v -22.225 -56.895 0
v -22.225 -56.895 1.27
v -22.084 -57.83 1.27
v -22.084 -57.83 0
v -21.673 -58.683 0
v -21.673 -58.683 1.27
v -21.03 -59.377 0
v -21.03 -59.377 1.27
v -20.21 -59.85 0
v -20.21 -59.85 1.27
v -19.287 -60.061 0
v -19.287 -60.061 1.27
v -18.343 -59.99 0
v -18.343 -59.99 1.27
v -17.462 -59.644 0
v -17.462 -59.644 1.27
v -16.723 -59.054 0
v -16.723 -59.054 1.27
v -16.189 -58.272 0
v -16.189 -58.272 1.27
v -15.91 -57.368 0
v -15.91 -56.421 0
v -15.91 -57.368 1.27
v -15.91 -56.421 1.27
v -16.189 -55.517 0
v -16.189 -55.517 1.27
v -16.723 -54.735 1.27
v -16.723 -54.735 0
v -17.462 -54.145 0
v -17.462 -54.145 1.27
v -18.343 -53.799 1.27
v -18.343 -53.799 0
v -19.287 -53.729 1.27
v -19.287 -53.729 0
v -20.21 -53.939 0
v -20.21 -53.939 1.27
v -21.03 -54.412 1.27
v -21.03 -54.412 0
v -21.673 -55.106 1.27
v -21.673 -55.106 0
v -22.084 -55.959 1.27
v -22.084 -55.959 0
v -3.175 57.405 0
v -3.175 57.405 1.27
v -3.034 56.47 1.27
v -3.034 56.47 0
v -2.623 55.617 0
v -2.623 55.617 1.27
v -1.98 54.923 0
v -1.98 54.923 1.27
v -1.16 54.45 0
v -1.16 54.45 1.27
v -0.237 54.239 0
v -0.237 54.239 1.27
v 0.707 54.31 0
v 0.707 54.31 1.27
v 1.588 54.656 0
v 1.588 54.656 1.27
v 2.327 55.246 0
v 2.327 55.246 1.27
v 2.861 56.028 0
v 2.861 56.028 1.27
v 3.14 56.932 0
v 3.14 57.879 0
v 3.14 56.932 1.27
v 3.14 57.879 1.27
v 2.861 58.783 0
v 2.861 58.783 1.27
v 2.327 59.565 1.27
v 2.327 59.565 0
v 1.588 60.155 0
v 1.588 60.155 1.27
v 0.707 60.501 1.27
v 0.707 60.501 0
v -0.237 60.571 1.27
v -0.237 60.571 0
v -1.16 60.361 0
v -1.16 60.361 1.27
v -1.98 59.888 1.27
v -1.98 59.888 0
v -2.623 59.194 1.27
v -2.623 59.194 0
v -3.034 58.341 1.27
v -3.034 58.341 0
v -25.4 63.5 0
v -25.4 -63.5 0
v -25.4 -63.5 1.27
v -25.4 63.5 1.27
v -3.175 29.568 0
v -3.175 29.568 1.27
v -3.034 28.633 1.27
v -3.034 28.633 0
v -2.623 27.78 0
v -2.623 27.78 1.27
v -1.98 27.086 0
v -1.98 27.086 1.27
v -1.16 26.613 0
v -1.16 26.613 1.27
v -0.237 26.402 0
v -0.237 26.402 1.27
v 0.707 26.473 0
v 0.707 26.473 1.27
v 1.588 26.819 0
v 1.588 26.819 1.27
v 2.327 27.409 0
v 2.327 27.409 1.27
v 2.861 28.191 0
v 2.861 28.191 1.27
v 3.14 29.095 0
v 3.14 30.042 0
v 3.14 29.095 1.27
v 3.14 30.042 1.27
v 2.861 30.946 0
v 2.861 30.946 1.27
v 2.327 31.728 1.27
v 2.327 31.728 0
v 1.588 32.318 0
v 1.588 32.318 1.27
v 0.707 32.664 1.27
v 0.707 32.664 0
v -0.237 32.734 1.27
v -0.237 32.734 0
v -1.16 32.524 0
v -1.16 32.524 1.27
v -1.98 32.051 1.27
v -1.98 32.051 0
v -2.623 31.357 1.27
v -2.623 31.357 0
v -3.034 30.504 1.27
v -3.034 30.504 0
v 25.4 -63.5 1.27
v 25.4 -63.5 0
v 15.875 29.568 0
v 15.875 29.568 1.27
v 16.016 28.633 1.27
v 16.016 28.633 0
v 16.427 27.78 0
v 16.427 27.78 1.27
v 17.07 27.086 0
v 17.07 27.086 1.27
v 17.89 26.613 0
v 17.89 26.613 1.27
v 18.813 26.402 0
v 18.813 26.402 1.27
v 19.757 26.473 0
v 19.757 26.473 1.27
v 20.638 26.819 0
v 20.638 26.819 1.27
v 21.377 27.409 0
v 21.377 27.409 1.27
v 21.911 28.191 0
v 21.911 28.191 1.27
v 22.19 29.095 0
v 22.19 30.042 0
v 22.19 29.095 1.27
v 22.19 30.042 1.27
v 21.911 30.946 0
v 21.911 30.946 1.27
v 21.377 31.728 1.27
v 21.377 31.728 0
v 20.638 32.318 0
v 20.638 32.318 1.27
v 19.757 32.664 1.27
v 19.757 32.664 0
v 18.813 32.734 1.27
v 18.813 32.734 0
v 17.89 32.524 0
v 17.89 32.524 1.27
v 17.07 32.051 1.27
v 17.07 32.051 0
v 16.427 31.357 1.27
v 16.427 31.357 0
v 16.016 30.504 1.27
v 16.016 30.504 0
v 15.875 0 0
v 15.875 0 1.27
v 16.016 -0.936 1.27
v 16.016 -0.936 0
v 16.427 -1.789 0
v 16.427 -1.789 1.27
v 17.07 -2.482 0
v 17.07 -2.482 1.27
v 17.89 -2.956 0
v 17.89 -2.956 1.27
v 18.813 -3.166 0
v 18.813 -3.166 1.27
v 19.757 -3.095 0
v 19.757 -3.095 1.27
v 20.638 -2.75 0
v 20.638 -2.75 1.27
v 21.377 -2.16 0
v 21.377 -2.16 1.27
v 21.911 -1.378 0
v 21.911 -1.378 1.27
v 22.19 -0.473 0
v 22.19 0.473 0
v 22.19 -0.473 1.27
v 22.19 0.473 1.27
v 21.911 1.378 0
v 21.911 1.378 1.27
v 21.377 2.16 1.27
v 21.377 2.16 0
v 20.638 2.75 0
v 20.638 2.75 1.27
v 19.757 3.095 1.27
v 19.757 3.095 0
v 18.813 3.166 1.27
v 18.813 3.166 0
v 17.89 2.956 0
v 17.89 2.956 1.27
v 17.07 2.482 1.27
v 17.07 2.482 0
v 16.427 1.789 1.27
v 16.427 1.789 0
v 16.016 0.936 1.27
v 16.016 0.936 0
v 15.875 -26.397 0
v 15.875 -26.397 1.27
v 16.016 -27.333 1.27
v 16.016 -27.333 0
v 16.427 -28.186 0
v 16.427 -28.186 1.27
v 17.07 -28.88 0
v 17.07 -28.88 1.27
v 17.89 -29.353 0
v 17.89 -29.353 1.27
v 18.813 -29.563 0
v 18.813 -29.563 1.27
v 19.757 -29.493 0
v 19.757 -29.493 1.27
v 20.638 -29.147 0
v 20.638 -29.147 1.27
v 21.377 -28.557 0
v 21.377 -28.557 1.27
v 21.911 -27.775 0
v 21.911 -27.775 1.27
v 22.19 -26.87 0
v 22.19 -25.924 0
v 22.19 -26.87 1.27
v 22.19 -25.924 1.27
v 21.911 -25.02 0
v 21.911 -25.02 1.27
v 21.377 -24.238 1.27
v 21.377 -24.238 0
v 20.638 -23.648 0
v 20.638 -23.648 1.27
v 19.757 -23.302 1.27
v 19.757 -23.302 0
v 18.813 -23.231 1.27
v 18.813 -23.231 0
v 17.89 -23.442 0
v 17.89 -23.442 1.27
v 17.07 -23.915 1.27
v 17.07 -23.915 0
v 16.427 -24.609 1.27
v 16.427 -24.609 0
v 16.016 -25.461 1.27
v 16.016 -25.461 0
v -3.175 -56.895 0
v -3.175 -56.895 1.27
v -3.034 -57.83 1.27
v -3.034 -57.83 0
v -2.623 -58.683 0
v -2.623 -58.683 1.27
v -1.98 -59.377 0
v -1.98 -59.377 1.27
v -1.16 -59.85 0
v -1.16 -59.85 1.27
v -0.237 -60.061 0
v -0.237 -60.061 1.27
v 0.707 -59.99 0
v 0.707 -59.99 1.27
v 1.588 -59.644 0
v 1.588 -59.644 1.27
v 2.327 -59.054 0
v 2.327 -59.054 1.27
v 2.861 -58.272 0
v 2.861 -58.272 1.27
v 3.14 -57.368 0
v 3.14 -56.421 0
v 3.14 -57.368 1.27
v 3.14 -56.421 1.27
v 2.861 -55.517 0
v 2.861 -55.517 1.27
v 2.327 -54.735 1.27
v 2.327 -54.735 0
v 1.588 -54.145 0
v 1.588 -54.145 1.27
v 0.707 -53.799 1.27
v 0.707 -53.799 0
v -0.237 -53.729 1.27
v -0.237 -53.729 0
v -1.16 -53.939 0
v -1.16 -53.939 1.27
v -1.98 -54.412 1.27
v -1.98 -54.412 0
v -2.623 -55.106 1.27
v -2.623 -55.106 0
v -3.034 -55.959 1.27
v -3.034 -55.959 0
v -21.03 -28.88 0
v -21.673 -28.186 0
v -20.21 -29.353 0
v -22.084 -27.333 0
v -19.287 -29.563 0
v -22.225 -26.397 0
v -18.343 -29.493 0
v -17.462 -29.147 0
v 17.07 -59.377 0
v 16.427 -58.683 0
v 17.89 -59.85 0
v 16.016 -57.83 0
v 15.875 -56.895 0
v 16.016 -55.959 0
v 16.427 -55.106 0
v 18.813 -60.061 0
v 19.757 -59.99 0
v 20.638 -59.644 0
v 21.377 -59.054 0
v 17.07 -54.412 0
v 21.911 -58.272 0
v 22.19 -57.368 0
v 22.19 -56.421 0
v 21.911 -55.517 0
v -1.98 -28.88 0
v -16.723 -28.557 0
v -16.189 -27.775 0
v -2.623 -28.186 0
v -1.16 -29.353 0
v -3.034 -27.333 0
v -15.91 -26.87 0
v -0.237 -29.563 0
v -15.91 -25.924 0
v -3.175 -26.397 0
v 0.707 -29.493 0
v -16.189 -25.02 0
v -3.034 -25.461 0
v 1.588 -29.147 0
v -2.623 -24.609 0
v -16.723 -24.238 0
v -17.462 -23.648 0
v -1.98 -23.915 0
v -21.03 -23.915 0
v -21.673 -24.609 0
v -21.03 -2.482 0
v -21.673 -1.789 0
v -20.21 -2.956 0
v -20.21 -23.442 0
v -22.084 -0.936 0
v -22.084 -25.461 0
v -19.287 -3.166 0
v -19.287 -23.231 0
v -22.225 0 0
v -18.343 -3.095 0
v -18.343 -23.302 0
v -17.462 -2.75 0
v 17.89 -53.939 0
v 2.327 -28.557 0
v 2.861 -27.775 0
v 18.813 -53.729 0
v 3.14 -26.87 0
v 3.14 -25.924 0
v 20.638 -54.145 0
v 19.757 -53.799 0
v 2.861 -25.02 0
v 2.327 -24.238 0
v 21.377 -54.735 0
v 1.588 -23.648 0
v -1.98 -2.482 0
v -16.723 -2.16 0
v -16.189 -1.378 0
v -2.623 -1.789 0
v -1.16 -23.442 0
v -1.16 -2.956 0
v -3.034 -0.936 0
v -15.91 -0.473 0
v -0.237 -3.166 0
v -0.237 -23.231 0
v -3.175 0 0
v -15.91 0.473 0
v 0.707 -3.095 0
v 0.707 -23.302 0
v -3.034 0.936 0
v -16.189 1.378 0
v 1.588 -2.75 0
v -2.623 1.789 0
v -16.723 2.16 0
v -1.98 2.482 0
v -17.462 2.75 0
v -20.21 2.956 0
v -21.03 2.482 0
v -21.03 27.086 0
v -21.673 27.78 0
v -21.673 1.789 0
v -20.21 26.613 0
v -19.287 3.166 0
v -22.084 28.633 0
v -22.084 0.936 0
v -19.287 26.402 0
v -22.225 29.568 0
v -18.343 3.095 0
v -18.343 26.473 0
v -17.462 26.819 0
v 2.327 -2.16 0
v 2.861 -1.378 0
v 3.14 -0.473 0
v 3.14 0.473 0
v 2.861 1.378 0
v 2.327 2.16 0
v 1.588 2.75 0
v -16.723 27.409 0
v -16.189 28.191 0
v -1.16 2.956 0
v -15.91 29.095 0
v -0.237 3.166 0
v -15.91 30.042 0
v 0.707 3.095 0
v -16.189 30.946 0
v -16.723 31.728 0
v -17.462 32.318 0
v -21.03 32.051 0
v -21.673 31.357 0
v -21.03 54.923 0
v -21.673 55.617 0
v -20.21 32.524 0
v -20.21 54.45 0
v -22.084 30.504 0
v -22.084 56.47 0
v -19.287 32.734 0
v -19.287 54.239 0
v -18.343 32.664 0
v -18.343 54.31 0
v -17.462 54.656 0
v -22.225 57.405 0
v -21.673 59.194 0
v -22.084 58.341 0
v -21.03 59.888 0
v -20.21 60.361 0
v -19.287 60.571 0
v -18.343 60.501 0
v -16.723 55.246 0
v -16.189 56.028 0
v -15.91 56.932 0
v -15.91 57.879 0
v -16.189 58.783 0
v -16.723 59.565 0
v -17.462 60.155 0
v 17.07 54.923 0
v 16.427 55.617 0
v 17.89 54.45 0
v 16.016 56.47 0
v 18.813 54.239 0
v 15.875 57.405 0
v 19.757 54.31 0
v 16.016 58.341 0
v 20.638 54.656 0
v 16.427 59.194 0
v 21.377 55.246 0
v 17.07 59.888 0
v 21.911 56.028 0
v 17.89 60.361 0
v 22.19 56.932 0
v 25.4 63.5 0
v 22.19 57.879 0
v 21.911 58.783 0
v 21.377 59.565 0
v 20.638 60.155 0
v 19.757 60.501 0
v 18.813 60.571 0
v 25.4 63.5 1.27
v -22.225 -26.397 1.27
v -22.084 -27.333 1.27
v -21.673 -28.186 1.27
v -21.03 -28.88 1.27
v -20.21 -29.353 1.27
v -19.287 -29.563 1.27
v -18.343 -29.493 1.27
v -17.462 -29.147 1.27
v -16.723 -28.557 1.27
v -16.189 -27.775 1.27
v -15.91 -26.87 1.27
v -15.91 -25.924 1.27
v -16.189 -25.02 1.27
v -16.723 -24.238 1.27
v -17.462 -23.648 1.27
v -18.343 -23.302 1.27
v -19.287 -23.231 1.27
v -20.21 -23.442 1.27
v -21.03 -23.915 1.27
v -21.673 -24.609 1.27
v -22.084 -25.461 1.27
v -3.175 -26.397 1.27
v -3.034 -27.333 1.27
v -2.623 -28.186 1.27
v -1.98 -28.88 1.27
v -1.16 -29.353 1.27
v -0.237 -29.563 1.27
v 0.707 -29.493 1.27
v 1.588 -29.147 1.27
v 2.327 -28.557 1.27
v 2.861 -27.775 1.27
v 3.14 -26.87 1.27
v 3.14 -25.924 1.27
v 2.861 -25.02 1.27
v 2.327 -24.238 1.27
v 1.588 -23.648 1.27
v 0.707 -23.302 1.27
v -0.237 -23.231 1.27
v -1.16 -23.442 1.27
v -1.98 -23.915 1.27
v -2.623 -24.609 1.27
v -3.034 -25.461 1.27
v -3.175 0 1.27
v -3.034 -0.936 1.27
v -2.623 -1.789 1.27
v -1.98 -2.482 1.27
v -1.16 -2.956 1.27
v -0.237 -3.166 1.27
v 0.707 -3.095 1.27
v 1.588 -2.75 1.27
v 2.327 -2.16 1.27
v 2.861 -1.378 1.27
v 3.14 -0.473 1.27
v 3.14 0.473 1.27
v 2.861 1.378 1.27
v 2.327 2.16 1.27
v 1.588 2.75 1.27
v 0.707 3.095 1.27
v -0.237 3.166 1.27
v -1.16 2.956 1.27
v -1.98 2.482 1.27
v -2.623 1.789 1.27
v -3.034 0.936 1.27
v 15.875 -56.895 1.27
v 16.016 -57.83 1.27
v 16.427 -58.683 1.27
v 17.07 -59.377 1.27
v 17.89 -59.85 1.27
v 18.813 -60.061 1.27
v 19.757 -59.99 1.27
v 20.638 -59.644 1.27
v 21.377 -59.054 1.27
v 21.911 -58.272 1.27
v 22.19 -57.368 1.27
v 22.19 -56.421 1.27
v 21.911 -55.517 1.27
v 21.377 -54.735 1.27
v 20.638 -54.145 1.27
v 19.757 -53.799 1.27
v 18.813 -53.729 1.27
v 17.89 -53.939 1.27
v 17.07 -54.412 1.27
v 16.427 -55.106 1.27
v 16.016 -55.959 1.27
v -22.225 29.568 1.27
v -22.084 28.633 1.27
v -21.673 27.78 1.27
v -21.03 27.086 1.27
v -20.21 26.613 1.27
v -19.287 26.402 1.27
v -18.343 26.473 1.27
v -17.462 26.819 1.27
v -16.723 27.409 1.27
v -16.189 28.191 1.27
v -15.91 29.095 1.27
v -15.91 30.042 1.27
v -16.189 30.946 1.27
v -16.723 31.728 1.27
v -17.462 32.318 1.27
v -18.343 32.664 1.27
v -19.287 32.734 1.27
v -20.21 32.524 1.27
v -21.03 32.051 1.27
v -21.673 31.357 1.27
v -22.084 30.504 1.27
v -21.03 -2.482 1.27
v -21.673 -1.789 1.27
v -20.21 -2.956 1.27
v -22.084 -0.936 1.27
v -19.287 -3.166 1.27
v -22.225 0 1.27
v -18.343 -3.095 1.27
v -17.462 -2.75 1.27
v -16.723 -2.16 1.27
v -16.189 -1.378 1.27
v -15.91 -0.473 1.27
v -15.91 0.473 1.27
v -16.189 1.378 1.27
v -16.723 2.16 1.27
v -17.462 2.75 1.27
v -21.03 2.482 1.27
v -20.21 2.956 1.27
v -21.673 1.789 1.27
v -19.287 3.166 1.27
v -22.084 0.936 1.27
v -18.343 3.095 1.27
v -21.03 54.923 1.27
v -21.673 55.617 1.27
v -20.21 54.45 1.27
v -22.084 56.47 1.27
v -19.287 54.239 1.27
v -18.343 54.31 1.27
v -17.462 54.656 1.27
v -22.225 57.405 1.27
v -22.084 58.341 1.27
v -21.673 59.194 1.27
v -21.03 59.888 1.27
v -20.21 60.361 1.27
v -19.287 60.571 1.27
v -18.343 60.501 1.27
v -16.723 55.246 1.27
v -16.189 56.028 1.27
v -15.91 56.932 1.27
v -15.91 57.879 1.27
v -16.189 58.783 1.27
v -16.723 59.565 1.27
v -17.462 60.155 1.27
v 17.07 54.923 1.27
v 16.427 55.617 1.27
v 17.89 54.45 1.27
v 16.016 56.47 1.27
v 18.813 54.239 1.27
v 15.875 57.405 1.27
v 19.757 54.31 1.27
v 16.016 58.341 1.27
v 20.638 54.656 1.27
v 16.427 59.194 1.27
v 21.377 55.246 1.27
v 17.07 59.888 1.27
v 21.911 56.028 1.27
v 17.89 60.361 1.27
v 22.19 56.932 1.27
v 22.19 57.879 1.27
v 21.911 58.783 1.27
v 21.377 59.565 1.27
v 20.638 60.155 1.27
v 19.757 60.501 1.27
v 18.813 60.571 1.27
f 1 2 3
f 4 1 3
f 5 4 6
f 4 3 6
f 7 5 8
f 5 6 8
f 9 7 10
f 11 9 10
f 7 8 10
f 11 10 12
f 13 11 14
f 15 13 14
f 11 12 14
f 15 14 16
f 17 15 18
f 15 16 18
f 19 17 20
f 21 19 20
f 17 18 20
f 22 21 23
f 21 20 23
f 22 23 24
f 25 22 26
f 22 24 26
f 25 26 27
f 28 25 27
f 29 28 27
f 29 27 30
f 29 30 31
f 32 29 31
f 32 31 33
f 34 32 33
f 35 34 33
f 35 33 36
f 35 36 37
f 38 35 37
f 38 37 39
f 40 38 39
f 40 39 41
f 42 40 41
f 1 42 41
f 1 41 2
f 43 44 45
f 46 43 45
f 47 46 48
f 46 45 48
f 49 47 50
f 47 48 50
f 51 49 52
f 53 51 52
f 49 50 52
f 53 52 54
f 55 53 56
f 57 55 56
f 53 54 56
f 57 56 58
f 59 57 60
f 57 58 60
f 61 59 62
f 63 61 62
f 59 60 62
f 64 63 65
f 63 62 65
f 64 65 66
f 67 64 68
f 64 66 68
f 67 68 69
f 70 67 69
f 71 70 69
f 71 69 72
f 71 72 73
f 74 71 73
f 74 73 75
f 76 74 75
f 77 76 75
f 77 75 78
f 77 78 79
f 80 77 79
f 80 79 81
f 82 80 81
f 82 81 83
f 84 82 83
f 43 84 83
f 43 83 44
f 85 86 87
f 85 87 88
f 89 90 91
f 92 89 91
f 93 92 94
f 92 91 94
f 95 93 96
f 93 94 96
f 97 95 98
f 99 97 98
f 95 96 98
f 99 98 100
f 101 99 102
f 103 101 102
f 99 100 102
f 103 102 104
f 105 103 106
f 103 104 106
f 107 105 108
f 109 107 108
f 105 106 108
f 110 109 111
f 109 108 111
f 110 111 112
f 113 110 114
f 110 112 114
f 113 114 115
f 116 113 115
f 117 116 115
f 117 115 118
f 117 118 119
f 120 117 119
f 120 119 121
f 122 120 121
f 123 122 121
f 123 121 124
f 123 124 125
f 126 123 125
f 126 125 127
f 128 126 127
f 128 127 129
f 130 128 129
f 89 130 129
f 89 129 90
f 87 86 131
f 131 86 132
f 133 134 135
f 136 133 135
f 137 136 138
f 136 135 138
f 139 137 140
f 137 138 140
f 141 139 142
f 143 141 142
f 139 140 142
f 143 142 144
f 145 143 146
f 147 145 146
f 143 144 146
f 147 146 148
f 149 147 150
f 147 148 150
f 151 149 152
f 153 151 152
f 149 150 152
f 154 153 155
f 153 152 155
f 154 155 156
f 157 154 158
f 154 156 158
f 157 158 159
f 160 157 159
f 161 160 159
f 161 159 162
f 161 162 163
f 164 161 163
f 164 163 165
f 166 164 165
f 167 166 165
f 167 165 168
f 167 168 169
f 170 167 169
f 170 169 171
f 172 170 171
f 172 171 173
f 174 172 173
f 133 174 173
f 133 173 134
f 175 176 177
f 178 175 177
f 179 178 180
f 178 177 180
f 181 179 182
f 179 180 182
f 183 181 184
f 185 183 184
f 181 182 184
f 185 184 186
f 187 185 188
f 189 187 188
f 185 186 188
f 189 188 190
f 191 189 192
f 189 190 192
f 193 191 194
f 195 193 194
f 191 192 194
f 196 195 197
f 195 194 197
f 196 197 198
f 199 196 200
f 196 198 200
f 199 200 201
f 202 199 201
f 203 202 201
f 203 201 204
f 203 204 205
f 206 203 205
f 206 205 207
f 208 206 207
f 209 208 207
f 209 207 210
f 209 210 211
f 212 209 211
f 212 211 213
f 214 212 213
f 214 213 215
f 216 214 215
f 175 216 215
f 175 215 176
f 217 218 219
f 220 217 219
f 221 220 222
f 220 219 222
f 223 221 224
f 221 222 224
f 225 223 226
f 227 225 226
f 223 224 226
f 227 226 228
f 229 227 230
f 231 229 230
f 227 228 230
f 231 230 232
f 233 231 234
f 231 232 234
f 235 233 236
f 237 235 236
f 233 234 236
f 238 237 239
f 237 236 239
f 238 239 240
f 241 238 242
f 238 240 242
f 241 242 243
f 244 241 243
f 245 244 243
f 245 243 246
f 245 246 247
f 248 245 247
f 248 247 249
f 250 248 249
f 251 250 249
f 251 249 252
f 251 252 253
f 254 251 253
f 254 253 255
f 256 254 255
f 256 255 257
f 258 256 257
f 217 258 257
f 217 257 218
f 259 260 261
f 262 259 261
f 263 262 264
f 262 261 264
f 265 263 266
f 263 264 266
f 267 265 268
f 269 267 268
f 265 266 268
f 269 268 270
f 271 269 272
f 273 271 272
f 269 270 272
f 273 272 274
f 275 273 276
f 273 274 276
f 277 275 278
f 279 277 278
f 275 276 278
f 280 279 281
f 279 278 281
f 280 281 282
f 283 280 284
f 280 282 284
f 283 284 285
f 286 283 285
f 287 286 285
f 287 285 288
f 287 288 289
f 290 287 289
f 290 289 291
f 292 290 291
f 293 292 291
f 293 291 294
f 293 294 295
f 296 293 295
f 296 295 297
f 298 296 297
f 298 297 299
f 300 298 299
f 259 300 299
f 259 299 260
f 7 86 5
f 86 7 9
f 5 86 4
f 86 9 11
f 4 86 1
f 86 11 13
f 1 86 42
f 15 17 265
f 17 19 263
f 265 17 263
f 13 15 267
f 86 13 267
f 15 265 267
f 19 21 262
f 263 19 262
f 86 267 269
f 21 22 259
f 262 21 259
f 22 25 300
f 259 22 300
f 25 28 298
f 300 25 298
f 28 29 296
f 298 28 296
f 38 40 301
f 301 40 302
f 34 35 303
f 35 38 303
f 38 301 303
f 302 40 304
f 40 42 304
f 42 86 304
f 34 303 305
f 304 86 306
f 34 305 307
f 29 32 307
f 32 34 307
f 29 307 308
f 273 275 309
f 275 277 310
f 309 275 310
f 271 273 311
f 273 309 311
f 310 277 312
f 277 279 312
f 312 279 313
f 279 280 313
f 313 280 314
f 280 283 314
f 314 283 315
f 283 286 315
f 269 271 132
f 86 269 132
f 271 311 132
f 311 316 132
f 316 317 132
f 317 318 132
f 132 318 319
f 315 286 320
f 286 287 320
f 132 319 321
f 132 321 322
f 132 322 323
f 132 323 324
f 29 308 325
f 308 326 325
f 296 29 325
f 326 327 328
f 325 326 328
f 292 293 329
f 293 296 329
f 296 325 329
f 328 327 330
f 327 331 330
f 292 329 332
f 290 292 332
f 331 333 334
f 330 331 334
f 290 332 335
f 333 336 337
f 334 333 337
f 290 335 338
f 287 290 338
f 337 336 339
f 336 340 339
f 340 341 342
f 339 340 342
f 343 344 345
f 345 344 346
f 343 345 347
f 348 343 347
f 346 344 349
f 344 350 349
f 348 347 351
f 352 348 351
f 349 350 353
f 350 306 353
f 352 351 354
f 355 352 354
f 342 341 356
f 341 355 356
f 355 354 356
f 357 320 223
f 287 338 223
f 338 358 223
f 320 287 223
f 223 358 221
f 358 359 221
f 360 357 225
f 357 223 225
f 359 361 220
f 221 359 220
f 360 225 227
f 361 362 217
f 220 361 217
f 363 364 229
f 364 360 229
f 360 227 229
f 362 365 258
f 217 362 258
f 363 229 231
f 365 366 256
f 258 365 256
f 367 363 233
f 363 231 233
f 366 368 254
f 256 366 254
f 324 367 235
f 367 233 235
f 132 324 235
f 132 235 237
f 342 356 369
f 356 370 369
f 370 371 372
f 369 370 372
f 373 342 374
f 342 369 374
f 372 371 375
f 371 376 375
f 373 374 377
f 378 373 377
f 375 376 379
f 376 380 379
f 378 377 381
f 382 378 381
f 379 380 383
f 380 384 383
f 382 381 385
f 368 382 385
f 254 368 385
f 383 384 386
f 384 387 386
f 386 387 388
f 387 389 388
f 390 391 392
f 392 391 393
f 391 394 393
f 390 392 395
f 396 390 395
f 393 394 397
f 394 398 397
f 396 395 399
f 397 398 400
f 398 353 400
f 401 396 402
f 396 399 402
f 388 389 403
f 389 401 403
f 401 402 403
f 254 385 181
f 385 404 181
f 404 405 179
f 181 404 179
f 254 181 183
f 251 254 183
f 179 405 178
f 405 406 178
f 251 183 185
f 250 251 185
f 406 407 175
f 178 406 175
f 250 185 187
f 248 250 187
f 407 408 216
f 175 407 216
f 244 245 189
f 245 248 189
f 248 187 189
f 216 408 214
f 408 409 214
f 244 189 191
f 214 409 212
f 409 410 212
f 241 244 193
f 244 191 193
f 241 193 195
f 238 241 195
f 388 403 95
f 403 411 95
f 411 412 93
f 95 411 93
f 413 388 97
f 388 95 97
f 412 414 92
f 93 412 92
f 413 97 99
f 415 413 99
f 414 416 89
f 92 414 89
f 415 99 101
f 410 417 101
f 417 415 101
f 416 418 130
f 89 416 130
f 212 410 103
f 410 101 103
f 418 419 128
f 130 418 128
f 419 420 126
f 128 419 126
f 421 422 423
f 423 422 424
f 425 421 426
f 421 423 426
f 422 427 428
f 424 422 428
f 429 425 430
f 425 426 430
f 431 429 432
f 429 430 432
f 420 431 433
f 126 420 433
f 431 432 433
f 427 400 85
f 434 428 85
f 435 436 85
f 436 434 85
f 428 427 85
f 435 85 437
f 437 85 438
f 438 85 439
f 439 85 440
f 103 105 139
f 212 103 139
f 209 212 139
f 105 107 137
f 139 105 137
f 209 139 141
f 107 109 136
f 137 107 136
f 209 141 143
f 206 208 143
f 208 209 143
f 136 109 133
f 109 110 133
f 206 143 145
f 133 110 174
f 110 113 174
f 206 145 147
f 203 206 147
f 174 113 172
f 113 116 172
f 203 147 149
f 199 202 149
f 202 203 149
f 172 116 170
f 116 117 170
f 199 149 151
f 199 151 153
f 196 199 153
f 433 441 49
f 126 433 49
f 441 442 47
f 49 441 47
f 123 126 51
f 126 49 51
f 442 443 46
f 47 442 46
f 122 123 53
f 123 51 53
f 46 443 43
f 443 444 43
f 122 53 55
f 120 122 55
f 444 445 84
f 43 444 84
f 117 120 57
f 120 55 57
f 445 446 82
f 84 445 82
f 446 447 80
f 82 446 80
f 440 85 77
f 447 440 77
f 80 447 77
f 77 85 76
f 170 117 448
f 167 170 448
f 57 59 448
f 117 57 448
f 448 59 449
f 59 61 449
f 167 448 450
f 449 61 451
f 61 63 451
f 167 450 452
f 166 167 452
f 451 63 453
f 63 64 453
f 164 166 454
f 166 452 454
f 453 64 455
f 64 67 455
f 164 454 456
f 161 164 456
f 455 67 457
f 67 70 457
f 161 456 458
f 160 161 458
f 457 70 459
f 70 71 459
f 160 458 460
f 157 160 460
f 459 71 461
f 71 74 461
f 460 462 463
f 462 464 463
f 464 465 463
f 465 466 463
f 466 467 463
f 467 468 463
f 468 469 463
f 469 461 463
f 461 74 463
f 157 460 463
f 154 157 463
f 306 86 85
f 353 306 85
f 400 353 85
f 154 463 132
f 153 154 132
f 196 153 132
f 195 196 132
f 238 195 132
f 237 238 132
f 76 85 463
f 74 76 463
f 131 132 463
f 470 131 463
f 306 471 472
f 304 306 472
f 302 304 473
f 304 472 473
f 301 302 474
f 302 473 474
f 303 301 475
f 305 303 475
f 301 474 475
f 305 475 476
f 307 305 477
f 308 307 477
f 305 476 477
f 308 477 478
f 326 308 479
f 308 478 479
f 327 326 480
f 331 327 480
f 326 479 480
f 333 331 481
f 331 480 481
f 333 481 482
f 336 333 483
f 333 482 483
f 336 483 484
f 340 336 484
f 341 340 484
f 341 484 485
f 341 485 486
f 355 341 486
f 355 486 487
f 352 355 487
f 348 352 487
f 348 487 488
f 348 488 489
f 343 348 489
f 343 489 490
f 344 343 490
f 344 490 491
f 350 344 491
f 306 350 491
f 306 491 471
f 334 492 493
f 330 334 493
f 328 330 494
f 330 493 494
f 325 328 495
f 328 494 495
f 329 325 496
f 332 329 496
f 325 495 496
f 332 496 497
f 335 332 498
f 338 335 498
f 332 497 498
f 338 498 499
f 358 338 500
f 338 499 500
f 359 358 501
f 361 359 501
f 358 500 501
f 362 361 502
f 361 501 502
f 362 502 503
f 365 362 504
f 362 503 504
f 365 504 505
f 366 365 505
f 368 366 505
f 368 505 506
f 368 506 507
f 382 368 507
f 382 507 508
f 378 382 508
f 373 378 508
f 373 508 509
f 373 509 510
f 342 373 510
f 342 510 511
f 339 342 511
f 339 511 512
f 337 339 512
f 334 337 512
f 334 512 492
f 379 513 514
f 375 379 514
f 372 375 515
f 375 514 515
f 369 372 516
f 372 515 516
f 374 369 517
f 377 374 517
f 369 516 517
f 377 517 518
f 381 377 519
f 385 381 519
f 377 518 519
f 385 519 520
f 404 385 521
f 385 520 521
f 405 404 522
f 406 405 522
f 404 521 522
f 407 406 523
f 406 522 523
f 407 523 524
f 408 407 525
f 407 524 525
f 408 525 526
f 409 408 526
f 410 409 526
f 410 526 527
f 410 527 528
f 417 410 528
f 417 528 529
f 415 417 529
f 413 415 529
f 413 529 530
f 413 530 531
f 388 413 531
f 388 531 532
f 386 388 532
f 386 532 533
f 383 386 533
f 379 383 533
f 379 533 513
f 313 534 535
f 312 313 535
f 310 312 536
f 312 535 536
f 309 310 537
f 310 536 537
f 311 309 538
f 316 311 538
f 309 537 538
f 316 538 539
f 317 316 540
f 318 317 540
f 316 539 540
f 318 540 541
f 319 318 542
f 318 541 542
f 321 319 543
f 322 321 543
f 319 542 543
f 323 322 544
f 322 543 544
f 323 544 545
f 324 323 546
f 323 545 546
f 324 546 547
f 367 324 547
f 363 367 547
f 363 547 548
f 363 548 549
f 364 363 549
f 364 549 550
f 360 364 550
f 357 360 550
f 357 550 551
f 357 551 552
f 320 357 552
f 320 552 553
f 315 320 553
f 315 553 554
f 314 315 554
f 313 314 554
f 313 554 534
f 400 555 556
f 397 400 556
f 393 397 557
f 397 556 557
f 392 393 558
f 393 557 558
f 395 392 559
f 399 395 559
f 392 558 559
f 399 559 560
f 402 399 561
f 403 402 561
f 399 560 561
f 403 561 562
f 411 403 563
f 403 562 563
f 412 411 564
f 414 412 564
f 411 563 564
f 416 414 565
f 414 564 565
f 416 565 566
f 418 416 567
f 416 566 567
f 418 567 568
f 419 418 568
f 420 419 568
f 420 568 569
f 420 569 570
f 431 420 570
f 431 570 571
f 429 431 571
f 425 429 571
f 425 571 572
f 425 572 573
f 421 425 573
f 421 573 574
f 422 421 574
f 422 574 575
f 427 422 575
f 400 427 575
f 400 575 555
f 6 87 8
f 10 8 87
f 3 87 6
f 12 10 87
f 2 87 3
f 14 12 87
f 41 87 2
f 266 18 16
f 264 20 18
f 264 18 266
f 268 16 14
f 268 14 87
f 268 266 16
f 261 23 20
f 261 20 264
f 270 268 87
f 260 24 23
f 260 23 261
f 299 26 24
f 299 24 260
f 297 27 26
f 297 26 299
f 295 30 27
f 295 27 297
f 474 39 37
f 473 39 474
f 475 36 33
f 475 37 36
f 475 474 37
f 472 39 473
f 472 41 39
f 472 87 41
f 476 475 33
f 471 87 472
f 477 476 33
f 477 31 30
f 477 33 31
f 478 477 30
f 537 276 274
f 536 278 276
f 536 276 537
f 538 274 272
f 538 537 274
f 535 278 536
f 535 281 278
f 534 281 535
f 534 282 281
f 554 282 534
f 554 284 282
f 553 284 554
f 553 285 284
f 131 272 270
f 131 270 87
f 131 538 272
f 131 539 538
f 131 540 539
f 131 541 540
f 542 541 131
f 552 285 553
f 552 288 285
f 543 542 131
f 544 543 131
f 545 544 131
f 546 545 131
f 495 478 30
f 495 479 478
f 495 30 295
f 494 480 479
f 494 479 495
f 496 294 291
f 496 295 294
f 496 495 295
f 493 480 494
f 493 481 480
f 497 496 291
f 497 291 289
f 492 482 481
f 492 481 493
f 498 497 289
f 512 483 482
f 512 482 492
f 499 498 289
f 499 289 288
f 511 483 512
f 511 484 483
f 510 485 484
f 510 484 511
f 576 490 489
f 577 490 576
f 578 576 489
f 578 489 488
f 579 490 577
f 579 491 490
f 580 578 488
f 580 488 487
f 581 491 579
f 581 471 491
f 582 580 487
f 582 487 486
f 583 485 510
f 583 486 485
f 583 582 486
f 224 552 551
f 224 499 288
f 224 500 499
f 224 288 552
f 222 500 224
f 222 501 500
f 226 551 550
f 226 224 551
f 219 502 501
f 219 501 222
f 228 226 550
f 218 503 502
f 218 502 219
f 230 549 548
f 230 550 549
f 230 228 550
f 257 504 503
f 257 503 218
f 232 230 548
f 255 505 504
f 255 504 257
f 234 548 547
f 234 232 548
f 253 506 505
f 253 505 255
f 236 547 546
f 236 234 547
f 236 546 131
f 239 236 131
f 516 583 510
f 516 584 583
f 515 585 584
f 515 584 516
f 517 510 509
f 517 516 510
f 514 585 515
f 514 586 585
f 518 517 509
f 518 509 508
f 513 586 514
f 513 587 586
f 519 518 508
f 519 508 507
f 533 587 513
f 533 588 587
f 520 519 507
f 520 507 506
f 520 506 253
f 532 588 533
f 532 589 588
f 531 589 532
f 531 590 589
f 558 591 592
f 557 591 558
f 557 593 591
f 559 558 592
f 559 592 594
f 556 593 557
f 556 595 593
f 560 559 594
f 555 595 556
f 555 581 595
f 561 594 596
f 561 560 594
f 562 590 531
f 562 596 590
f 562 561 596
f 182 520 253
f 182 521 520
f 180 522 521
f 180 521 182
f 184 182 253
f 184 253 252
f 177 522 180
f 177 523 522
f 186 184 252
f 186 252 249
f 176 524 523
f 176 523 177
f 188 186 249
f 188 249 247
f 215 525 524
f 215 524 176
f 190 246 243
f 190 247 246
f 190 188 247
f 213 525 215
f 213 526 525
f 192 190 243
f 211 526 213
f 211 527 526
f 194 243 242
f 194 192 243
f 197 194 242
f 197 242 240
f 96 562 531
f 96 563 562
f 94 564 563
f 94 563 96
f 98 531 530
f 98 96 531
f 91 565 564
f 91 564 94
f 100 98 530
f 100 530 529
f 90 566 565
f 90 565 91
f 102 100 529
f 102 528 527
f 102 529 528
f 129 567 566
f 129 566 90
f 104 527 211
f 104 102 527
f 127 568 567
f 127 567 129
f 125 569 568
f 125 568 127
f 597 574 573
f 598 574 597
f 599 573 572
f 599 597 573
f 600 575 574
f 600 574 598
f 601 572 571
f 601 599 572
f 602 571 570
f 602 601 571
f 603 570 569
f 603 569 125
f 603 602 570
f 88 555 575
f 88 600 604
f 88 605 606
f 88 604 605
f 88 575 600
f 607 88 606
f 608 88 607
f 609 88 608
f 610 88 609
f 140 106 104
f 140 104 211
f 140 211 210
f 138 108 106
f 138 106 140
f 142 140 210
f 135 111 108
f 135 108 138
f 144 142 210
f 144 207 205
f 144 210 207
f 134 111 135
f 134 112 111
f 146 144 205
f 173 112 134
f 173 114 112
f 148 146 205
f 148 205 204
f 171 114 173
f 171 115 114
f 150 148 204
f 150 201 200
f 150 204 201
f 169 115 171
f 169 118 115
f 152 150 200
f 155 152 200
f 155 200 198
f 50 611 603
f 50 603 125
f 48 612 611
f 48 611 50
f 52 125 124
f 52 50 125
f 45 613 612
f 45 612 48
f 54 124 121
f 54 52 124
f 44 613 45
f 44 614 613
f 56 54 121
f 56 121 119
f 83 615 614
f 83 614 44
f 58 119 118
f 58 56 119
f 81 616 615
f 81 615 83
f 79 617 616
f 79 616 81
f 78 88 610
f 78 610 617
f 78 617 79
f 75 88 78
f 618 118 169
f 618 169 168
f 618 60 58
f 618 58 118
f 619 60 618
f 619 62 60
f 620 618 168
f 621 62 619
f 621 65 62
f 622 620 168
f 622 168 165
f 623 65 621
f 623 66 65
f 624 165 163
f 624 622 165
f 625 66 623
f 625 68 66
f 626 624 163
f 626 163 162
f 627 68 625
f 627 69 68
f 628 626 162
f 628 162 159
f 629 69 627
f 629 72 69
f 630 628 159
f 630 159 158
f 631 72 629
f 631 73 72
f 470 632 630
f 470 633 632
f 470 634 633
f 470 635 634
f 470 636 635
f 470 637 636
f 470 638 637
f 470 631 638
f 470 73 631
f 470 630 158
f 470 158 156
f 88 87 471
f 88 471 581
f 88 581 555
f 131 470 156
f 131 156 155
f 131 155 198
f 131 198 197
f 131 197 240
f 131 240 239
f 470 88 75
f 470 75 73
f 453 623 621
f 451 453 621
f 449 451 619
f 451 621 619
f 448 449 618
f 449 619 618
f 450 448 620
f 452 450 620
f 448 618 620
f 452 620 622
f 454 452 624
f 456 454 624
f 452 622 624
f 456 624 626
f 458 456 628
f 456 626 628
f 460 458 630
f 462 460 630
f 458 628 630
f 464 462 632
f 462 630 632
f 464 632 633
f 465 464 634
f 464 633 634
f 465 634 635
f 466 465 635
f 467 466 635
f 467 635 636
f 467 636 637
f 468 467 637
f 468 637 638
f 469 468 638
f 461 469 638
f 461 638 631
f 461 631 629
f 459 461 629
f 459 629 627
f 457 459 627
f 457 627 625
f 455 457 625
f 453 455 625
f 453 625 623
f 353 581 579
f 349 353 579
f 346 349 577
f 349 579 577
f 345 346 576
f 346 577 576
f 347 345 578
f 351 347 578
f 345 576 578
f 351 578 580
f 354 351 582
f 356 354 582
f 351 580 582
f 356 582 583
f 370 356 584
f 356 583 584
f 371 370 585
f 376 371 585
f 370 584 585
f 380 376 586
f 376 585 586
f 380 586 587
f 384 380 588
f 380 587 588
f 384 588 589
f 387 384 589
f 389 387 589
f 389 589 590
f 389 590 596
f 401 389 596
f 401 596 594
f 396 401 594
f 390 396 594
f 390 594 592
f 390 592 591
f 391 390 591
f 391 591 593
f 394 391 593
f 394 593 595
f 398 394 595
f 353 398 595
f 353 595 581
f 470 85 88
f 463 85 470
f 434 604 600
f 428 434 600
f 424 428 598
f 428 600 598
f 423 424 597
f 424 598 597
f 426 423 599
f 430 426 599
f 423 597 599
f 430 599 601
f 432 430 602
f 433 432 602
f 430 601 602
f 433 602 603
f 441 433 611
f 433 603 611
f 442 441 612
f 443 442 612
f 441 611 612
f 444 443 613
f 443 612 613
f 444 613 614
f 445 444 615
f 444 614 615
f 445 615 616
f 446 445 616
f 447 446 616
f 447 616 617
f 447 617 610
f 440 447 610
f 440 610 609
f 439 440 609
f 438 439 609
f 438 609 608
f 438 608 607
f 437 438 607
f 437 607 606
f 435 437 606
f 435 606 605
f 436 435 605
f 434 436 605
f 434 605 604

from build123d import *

# Parameters (mm, degrees)
F0_W       = 50.8
F0_H       = 127
F1_DEPTH   = 1.27
F3_D       = 6.35
F3_ON_F0_D = 6.35


with BuildPart() as f1:
    # F0 (on Top) → F1 (new body)
    with BuildSketch(Plane.XY):
        Rectangle(F0_W, F0_H)
    extrude(amount=F1_DEPTH)

    # F3 (through all)
    with Locations(Plane(origin=(0, 0, 0), x_dir=(1, 0, 0), z_dir=(0, 0, -1))):
        with Locations((-19.05, -57.4053688833), (0, -57.4053688833), (19.05, -57.4053688833), (19.05, -29.5683733465), (0, -29.5683733465), (-19.05, -29.5683733465), (-19.05, 0), (19.05, 0), (19.05, 26.3971900072), (0, 56.8946311167), (0, 26.3971900072), (-19.05, 26.3971900072), (-19.05, 56.8946311167), (19.05, 56.8946311167)):
            Hole(F3_D / 2)

    # F3 on F0 (through all)
    with Locations(Plane(origin=(0, 0, 0), x_dir=(1, 0, 0), z_dir=(0, 0, -1))):
        with Locations((0, 0)):
            Hole(F3_ON_F0_D / 2)


solid = f1.part
